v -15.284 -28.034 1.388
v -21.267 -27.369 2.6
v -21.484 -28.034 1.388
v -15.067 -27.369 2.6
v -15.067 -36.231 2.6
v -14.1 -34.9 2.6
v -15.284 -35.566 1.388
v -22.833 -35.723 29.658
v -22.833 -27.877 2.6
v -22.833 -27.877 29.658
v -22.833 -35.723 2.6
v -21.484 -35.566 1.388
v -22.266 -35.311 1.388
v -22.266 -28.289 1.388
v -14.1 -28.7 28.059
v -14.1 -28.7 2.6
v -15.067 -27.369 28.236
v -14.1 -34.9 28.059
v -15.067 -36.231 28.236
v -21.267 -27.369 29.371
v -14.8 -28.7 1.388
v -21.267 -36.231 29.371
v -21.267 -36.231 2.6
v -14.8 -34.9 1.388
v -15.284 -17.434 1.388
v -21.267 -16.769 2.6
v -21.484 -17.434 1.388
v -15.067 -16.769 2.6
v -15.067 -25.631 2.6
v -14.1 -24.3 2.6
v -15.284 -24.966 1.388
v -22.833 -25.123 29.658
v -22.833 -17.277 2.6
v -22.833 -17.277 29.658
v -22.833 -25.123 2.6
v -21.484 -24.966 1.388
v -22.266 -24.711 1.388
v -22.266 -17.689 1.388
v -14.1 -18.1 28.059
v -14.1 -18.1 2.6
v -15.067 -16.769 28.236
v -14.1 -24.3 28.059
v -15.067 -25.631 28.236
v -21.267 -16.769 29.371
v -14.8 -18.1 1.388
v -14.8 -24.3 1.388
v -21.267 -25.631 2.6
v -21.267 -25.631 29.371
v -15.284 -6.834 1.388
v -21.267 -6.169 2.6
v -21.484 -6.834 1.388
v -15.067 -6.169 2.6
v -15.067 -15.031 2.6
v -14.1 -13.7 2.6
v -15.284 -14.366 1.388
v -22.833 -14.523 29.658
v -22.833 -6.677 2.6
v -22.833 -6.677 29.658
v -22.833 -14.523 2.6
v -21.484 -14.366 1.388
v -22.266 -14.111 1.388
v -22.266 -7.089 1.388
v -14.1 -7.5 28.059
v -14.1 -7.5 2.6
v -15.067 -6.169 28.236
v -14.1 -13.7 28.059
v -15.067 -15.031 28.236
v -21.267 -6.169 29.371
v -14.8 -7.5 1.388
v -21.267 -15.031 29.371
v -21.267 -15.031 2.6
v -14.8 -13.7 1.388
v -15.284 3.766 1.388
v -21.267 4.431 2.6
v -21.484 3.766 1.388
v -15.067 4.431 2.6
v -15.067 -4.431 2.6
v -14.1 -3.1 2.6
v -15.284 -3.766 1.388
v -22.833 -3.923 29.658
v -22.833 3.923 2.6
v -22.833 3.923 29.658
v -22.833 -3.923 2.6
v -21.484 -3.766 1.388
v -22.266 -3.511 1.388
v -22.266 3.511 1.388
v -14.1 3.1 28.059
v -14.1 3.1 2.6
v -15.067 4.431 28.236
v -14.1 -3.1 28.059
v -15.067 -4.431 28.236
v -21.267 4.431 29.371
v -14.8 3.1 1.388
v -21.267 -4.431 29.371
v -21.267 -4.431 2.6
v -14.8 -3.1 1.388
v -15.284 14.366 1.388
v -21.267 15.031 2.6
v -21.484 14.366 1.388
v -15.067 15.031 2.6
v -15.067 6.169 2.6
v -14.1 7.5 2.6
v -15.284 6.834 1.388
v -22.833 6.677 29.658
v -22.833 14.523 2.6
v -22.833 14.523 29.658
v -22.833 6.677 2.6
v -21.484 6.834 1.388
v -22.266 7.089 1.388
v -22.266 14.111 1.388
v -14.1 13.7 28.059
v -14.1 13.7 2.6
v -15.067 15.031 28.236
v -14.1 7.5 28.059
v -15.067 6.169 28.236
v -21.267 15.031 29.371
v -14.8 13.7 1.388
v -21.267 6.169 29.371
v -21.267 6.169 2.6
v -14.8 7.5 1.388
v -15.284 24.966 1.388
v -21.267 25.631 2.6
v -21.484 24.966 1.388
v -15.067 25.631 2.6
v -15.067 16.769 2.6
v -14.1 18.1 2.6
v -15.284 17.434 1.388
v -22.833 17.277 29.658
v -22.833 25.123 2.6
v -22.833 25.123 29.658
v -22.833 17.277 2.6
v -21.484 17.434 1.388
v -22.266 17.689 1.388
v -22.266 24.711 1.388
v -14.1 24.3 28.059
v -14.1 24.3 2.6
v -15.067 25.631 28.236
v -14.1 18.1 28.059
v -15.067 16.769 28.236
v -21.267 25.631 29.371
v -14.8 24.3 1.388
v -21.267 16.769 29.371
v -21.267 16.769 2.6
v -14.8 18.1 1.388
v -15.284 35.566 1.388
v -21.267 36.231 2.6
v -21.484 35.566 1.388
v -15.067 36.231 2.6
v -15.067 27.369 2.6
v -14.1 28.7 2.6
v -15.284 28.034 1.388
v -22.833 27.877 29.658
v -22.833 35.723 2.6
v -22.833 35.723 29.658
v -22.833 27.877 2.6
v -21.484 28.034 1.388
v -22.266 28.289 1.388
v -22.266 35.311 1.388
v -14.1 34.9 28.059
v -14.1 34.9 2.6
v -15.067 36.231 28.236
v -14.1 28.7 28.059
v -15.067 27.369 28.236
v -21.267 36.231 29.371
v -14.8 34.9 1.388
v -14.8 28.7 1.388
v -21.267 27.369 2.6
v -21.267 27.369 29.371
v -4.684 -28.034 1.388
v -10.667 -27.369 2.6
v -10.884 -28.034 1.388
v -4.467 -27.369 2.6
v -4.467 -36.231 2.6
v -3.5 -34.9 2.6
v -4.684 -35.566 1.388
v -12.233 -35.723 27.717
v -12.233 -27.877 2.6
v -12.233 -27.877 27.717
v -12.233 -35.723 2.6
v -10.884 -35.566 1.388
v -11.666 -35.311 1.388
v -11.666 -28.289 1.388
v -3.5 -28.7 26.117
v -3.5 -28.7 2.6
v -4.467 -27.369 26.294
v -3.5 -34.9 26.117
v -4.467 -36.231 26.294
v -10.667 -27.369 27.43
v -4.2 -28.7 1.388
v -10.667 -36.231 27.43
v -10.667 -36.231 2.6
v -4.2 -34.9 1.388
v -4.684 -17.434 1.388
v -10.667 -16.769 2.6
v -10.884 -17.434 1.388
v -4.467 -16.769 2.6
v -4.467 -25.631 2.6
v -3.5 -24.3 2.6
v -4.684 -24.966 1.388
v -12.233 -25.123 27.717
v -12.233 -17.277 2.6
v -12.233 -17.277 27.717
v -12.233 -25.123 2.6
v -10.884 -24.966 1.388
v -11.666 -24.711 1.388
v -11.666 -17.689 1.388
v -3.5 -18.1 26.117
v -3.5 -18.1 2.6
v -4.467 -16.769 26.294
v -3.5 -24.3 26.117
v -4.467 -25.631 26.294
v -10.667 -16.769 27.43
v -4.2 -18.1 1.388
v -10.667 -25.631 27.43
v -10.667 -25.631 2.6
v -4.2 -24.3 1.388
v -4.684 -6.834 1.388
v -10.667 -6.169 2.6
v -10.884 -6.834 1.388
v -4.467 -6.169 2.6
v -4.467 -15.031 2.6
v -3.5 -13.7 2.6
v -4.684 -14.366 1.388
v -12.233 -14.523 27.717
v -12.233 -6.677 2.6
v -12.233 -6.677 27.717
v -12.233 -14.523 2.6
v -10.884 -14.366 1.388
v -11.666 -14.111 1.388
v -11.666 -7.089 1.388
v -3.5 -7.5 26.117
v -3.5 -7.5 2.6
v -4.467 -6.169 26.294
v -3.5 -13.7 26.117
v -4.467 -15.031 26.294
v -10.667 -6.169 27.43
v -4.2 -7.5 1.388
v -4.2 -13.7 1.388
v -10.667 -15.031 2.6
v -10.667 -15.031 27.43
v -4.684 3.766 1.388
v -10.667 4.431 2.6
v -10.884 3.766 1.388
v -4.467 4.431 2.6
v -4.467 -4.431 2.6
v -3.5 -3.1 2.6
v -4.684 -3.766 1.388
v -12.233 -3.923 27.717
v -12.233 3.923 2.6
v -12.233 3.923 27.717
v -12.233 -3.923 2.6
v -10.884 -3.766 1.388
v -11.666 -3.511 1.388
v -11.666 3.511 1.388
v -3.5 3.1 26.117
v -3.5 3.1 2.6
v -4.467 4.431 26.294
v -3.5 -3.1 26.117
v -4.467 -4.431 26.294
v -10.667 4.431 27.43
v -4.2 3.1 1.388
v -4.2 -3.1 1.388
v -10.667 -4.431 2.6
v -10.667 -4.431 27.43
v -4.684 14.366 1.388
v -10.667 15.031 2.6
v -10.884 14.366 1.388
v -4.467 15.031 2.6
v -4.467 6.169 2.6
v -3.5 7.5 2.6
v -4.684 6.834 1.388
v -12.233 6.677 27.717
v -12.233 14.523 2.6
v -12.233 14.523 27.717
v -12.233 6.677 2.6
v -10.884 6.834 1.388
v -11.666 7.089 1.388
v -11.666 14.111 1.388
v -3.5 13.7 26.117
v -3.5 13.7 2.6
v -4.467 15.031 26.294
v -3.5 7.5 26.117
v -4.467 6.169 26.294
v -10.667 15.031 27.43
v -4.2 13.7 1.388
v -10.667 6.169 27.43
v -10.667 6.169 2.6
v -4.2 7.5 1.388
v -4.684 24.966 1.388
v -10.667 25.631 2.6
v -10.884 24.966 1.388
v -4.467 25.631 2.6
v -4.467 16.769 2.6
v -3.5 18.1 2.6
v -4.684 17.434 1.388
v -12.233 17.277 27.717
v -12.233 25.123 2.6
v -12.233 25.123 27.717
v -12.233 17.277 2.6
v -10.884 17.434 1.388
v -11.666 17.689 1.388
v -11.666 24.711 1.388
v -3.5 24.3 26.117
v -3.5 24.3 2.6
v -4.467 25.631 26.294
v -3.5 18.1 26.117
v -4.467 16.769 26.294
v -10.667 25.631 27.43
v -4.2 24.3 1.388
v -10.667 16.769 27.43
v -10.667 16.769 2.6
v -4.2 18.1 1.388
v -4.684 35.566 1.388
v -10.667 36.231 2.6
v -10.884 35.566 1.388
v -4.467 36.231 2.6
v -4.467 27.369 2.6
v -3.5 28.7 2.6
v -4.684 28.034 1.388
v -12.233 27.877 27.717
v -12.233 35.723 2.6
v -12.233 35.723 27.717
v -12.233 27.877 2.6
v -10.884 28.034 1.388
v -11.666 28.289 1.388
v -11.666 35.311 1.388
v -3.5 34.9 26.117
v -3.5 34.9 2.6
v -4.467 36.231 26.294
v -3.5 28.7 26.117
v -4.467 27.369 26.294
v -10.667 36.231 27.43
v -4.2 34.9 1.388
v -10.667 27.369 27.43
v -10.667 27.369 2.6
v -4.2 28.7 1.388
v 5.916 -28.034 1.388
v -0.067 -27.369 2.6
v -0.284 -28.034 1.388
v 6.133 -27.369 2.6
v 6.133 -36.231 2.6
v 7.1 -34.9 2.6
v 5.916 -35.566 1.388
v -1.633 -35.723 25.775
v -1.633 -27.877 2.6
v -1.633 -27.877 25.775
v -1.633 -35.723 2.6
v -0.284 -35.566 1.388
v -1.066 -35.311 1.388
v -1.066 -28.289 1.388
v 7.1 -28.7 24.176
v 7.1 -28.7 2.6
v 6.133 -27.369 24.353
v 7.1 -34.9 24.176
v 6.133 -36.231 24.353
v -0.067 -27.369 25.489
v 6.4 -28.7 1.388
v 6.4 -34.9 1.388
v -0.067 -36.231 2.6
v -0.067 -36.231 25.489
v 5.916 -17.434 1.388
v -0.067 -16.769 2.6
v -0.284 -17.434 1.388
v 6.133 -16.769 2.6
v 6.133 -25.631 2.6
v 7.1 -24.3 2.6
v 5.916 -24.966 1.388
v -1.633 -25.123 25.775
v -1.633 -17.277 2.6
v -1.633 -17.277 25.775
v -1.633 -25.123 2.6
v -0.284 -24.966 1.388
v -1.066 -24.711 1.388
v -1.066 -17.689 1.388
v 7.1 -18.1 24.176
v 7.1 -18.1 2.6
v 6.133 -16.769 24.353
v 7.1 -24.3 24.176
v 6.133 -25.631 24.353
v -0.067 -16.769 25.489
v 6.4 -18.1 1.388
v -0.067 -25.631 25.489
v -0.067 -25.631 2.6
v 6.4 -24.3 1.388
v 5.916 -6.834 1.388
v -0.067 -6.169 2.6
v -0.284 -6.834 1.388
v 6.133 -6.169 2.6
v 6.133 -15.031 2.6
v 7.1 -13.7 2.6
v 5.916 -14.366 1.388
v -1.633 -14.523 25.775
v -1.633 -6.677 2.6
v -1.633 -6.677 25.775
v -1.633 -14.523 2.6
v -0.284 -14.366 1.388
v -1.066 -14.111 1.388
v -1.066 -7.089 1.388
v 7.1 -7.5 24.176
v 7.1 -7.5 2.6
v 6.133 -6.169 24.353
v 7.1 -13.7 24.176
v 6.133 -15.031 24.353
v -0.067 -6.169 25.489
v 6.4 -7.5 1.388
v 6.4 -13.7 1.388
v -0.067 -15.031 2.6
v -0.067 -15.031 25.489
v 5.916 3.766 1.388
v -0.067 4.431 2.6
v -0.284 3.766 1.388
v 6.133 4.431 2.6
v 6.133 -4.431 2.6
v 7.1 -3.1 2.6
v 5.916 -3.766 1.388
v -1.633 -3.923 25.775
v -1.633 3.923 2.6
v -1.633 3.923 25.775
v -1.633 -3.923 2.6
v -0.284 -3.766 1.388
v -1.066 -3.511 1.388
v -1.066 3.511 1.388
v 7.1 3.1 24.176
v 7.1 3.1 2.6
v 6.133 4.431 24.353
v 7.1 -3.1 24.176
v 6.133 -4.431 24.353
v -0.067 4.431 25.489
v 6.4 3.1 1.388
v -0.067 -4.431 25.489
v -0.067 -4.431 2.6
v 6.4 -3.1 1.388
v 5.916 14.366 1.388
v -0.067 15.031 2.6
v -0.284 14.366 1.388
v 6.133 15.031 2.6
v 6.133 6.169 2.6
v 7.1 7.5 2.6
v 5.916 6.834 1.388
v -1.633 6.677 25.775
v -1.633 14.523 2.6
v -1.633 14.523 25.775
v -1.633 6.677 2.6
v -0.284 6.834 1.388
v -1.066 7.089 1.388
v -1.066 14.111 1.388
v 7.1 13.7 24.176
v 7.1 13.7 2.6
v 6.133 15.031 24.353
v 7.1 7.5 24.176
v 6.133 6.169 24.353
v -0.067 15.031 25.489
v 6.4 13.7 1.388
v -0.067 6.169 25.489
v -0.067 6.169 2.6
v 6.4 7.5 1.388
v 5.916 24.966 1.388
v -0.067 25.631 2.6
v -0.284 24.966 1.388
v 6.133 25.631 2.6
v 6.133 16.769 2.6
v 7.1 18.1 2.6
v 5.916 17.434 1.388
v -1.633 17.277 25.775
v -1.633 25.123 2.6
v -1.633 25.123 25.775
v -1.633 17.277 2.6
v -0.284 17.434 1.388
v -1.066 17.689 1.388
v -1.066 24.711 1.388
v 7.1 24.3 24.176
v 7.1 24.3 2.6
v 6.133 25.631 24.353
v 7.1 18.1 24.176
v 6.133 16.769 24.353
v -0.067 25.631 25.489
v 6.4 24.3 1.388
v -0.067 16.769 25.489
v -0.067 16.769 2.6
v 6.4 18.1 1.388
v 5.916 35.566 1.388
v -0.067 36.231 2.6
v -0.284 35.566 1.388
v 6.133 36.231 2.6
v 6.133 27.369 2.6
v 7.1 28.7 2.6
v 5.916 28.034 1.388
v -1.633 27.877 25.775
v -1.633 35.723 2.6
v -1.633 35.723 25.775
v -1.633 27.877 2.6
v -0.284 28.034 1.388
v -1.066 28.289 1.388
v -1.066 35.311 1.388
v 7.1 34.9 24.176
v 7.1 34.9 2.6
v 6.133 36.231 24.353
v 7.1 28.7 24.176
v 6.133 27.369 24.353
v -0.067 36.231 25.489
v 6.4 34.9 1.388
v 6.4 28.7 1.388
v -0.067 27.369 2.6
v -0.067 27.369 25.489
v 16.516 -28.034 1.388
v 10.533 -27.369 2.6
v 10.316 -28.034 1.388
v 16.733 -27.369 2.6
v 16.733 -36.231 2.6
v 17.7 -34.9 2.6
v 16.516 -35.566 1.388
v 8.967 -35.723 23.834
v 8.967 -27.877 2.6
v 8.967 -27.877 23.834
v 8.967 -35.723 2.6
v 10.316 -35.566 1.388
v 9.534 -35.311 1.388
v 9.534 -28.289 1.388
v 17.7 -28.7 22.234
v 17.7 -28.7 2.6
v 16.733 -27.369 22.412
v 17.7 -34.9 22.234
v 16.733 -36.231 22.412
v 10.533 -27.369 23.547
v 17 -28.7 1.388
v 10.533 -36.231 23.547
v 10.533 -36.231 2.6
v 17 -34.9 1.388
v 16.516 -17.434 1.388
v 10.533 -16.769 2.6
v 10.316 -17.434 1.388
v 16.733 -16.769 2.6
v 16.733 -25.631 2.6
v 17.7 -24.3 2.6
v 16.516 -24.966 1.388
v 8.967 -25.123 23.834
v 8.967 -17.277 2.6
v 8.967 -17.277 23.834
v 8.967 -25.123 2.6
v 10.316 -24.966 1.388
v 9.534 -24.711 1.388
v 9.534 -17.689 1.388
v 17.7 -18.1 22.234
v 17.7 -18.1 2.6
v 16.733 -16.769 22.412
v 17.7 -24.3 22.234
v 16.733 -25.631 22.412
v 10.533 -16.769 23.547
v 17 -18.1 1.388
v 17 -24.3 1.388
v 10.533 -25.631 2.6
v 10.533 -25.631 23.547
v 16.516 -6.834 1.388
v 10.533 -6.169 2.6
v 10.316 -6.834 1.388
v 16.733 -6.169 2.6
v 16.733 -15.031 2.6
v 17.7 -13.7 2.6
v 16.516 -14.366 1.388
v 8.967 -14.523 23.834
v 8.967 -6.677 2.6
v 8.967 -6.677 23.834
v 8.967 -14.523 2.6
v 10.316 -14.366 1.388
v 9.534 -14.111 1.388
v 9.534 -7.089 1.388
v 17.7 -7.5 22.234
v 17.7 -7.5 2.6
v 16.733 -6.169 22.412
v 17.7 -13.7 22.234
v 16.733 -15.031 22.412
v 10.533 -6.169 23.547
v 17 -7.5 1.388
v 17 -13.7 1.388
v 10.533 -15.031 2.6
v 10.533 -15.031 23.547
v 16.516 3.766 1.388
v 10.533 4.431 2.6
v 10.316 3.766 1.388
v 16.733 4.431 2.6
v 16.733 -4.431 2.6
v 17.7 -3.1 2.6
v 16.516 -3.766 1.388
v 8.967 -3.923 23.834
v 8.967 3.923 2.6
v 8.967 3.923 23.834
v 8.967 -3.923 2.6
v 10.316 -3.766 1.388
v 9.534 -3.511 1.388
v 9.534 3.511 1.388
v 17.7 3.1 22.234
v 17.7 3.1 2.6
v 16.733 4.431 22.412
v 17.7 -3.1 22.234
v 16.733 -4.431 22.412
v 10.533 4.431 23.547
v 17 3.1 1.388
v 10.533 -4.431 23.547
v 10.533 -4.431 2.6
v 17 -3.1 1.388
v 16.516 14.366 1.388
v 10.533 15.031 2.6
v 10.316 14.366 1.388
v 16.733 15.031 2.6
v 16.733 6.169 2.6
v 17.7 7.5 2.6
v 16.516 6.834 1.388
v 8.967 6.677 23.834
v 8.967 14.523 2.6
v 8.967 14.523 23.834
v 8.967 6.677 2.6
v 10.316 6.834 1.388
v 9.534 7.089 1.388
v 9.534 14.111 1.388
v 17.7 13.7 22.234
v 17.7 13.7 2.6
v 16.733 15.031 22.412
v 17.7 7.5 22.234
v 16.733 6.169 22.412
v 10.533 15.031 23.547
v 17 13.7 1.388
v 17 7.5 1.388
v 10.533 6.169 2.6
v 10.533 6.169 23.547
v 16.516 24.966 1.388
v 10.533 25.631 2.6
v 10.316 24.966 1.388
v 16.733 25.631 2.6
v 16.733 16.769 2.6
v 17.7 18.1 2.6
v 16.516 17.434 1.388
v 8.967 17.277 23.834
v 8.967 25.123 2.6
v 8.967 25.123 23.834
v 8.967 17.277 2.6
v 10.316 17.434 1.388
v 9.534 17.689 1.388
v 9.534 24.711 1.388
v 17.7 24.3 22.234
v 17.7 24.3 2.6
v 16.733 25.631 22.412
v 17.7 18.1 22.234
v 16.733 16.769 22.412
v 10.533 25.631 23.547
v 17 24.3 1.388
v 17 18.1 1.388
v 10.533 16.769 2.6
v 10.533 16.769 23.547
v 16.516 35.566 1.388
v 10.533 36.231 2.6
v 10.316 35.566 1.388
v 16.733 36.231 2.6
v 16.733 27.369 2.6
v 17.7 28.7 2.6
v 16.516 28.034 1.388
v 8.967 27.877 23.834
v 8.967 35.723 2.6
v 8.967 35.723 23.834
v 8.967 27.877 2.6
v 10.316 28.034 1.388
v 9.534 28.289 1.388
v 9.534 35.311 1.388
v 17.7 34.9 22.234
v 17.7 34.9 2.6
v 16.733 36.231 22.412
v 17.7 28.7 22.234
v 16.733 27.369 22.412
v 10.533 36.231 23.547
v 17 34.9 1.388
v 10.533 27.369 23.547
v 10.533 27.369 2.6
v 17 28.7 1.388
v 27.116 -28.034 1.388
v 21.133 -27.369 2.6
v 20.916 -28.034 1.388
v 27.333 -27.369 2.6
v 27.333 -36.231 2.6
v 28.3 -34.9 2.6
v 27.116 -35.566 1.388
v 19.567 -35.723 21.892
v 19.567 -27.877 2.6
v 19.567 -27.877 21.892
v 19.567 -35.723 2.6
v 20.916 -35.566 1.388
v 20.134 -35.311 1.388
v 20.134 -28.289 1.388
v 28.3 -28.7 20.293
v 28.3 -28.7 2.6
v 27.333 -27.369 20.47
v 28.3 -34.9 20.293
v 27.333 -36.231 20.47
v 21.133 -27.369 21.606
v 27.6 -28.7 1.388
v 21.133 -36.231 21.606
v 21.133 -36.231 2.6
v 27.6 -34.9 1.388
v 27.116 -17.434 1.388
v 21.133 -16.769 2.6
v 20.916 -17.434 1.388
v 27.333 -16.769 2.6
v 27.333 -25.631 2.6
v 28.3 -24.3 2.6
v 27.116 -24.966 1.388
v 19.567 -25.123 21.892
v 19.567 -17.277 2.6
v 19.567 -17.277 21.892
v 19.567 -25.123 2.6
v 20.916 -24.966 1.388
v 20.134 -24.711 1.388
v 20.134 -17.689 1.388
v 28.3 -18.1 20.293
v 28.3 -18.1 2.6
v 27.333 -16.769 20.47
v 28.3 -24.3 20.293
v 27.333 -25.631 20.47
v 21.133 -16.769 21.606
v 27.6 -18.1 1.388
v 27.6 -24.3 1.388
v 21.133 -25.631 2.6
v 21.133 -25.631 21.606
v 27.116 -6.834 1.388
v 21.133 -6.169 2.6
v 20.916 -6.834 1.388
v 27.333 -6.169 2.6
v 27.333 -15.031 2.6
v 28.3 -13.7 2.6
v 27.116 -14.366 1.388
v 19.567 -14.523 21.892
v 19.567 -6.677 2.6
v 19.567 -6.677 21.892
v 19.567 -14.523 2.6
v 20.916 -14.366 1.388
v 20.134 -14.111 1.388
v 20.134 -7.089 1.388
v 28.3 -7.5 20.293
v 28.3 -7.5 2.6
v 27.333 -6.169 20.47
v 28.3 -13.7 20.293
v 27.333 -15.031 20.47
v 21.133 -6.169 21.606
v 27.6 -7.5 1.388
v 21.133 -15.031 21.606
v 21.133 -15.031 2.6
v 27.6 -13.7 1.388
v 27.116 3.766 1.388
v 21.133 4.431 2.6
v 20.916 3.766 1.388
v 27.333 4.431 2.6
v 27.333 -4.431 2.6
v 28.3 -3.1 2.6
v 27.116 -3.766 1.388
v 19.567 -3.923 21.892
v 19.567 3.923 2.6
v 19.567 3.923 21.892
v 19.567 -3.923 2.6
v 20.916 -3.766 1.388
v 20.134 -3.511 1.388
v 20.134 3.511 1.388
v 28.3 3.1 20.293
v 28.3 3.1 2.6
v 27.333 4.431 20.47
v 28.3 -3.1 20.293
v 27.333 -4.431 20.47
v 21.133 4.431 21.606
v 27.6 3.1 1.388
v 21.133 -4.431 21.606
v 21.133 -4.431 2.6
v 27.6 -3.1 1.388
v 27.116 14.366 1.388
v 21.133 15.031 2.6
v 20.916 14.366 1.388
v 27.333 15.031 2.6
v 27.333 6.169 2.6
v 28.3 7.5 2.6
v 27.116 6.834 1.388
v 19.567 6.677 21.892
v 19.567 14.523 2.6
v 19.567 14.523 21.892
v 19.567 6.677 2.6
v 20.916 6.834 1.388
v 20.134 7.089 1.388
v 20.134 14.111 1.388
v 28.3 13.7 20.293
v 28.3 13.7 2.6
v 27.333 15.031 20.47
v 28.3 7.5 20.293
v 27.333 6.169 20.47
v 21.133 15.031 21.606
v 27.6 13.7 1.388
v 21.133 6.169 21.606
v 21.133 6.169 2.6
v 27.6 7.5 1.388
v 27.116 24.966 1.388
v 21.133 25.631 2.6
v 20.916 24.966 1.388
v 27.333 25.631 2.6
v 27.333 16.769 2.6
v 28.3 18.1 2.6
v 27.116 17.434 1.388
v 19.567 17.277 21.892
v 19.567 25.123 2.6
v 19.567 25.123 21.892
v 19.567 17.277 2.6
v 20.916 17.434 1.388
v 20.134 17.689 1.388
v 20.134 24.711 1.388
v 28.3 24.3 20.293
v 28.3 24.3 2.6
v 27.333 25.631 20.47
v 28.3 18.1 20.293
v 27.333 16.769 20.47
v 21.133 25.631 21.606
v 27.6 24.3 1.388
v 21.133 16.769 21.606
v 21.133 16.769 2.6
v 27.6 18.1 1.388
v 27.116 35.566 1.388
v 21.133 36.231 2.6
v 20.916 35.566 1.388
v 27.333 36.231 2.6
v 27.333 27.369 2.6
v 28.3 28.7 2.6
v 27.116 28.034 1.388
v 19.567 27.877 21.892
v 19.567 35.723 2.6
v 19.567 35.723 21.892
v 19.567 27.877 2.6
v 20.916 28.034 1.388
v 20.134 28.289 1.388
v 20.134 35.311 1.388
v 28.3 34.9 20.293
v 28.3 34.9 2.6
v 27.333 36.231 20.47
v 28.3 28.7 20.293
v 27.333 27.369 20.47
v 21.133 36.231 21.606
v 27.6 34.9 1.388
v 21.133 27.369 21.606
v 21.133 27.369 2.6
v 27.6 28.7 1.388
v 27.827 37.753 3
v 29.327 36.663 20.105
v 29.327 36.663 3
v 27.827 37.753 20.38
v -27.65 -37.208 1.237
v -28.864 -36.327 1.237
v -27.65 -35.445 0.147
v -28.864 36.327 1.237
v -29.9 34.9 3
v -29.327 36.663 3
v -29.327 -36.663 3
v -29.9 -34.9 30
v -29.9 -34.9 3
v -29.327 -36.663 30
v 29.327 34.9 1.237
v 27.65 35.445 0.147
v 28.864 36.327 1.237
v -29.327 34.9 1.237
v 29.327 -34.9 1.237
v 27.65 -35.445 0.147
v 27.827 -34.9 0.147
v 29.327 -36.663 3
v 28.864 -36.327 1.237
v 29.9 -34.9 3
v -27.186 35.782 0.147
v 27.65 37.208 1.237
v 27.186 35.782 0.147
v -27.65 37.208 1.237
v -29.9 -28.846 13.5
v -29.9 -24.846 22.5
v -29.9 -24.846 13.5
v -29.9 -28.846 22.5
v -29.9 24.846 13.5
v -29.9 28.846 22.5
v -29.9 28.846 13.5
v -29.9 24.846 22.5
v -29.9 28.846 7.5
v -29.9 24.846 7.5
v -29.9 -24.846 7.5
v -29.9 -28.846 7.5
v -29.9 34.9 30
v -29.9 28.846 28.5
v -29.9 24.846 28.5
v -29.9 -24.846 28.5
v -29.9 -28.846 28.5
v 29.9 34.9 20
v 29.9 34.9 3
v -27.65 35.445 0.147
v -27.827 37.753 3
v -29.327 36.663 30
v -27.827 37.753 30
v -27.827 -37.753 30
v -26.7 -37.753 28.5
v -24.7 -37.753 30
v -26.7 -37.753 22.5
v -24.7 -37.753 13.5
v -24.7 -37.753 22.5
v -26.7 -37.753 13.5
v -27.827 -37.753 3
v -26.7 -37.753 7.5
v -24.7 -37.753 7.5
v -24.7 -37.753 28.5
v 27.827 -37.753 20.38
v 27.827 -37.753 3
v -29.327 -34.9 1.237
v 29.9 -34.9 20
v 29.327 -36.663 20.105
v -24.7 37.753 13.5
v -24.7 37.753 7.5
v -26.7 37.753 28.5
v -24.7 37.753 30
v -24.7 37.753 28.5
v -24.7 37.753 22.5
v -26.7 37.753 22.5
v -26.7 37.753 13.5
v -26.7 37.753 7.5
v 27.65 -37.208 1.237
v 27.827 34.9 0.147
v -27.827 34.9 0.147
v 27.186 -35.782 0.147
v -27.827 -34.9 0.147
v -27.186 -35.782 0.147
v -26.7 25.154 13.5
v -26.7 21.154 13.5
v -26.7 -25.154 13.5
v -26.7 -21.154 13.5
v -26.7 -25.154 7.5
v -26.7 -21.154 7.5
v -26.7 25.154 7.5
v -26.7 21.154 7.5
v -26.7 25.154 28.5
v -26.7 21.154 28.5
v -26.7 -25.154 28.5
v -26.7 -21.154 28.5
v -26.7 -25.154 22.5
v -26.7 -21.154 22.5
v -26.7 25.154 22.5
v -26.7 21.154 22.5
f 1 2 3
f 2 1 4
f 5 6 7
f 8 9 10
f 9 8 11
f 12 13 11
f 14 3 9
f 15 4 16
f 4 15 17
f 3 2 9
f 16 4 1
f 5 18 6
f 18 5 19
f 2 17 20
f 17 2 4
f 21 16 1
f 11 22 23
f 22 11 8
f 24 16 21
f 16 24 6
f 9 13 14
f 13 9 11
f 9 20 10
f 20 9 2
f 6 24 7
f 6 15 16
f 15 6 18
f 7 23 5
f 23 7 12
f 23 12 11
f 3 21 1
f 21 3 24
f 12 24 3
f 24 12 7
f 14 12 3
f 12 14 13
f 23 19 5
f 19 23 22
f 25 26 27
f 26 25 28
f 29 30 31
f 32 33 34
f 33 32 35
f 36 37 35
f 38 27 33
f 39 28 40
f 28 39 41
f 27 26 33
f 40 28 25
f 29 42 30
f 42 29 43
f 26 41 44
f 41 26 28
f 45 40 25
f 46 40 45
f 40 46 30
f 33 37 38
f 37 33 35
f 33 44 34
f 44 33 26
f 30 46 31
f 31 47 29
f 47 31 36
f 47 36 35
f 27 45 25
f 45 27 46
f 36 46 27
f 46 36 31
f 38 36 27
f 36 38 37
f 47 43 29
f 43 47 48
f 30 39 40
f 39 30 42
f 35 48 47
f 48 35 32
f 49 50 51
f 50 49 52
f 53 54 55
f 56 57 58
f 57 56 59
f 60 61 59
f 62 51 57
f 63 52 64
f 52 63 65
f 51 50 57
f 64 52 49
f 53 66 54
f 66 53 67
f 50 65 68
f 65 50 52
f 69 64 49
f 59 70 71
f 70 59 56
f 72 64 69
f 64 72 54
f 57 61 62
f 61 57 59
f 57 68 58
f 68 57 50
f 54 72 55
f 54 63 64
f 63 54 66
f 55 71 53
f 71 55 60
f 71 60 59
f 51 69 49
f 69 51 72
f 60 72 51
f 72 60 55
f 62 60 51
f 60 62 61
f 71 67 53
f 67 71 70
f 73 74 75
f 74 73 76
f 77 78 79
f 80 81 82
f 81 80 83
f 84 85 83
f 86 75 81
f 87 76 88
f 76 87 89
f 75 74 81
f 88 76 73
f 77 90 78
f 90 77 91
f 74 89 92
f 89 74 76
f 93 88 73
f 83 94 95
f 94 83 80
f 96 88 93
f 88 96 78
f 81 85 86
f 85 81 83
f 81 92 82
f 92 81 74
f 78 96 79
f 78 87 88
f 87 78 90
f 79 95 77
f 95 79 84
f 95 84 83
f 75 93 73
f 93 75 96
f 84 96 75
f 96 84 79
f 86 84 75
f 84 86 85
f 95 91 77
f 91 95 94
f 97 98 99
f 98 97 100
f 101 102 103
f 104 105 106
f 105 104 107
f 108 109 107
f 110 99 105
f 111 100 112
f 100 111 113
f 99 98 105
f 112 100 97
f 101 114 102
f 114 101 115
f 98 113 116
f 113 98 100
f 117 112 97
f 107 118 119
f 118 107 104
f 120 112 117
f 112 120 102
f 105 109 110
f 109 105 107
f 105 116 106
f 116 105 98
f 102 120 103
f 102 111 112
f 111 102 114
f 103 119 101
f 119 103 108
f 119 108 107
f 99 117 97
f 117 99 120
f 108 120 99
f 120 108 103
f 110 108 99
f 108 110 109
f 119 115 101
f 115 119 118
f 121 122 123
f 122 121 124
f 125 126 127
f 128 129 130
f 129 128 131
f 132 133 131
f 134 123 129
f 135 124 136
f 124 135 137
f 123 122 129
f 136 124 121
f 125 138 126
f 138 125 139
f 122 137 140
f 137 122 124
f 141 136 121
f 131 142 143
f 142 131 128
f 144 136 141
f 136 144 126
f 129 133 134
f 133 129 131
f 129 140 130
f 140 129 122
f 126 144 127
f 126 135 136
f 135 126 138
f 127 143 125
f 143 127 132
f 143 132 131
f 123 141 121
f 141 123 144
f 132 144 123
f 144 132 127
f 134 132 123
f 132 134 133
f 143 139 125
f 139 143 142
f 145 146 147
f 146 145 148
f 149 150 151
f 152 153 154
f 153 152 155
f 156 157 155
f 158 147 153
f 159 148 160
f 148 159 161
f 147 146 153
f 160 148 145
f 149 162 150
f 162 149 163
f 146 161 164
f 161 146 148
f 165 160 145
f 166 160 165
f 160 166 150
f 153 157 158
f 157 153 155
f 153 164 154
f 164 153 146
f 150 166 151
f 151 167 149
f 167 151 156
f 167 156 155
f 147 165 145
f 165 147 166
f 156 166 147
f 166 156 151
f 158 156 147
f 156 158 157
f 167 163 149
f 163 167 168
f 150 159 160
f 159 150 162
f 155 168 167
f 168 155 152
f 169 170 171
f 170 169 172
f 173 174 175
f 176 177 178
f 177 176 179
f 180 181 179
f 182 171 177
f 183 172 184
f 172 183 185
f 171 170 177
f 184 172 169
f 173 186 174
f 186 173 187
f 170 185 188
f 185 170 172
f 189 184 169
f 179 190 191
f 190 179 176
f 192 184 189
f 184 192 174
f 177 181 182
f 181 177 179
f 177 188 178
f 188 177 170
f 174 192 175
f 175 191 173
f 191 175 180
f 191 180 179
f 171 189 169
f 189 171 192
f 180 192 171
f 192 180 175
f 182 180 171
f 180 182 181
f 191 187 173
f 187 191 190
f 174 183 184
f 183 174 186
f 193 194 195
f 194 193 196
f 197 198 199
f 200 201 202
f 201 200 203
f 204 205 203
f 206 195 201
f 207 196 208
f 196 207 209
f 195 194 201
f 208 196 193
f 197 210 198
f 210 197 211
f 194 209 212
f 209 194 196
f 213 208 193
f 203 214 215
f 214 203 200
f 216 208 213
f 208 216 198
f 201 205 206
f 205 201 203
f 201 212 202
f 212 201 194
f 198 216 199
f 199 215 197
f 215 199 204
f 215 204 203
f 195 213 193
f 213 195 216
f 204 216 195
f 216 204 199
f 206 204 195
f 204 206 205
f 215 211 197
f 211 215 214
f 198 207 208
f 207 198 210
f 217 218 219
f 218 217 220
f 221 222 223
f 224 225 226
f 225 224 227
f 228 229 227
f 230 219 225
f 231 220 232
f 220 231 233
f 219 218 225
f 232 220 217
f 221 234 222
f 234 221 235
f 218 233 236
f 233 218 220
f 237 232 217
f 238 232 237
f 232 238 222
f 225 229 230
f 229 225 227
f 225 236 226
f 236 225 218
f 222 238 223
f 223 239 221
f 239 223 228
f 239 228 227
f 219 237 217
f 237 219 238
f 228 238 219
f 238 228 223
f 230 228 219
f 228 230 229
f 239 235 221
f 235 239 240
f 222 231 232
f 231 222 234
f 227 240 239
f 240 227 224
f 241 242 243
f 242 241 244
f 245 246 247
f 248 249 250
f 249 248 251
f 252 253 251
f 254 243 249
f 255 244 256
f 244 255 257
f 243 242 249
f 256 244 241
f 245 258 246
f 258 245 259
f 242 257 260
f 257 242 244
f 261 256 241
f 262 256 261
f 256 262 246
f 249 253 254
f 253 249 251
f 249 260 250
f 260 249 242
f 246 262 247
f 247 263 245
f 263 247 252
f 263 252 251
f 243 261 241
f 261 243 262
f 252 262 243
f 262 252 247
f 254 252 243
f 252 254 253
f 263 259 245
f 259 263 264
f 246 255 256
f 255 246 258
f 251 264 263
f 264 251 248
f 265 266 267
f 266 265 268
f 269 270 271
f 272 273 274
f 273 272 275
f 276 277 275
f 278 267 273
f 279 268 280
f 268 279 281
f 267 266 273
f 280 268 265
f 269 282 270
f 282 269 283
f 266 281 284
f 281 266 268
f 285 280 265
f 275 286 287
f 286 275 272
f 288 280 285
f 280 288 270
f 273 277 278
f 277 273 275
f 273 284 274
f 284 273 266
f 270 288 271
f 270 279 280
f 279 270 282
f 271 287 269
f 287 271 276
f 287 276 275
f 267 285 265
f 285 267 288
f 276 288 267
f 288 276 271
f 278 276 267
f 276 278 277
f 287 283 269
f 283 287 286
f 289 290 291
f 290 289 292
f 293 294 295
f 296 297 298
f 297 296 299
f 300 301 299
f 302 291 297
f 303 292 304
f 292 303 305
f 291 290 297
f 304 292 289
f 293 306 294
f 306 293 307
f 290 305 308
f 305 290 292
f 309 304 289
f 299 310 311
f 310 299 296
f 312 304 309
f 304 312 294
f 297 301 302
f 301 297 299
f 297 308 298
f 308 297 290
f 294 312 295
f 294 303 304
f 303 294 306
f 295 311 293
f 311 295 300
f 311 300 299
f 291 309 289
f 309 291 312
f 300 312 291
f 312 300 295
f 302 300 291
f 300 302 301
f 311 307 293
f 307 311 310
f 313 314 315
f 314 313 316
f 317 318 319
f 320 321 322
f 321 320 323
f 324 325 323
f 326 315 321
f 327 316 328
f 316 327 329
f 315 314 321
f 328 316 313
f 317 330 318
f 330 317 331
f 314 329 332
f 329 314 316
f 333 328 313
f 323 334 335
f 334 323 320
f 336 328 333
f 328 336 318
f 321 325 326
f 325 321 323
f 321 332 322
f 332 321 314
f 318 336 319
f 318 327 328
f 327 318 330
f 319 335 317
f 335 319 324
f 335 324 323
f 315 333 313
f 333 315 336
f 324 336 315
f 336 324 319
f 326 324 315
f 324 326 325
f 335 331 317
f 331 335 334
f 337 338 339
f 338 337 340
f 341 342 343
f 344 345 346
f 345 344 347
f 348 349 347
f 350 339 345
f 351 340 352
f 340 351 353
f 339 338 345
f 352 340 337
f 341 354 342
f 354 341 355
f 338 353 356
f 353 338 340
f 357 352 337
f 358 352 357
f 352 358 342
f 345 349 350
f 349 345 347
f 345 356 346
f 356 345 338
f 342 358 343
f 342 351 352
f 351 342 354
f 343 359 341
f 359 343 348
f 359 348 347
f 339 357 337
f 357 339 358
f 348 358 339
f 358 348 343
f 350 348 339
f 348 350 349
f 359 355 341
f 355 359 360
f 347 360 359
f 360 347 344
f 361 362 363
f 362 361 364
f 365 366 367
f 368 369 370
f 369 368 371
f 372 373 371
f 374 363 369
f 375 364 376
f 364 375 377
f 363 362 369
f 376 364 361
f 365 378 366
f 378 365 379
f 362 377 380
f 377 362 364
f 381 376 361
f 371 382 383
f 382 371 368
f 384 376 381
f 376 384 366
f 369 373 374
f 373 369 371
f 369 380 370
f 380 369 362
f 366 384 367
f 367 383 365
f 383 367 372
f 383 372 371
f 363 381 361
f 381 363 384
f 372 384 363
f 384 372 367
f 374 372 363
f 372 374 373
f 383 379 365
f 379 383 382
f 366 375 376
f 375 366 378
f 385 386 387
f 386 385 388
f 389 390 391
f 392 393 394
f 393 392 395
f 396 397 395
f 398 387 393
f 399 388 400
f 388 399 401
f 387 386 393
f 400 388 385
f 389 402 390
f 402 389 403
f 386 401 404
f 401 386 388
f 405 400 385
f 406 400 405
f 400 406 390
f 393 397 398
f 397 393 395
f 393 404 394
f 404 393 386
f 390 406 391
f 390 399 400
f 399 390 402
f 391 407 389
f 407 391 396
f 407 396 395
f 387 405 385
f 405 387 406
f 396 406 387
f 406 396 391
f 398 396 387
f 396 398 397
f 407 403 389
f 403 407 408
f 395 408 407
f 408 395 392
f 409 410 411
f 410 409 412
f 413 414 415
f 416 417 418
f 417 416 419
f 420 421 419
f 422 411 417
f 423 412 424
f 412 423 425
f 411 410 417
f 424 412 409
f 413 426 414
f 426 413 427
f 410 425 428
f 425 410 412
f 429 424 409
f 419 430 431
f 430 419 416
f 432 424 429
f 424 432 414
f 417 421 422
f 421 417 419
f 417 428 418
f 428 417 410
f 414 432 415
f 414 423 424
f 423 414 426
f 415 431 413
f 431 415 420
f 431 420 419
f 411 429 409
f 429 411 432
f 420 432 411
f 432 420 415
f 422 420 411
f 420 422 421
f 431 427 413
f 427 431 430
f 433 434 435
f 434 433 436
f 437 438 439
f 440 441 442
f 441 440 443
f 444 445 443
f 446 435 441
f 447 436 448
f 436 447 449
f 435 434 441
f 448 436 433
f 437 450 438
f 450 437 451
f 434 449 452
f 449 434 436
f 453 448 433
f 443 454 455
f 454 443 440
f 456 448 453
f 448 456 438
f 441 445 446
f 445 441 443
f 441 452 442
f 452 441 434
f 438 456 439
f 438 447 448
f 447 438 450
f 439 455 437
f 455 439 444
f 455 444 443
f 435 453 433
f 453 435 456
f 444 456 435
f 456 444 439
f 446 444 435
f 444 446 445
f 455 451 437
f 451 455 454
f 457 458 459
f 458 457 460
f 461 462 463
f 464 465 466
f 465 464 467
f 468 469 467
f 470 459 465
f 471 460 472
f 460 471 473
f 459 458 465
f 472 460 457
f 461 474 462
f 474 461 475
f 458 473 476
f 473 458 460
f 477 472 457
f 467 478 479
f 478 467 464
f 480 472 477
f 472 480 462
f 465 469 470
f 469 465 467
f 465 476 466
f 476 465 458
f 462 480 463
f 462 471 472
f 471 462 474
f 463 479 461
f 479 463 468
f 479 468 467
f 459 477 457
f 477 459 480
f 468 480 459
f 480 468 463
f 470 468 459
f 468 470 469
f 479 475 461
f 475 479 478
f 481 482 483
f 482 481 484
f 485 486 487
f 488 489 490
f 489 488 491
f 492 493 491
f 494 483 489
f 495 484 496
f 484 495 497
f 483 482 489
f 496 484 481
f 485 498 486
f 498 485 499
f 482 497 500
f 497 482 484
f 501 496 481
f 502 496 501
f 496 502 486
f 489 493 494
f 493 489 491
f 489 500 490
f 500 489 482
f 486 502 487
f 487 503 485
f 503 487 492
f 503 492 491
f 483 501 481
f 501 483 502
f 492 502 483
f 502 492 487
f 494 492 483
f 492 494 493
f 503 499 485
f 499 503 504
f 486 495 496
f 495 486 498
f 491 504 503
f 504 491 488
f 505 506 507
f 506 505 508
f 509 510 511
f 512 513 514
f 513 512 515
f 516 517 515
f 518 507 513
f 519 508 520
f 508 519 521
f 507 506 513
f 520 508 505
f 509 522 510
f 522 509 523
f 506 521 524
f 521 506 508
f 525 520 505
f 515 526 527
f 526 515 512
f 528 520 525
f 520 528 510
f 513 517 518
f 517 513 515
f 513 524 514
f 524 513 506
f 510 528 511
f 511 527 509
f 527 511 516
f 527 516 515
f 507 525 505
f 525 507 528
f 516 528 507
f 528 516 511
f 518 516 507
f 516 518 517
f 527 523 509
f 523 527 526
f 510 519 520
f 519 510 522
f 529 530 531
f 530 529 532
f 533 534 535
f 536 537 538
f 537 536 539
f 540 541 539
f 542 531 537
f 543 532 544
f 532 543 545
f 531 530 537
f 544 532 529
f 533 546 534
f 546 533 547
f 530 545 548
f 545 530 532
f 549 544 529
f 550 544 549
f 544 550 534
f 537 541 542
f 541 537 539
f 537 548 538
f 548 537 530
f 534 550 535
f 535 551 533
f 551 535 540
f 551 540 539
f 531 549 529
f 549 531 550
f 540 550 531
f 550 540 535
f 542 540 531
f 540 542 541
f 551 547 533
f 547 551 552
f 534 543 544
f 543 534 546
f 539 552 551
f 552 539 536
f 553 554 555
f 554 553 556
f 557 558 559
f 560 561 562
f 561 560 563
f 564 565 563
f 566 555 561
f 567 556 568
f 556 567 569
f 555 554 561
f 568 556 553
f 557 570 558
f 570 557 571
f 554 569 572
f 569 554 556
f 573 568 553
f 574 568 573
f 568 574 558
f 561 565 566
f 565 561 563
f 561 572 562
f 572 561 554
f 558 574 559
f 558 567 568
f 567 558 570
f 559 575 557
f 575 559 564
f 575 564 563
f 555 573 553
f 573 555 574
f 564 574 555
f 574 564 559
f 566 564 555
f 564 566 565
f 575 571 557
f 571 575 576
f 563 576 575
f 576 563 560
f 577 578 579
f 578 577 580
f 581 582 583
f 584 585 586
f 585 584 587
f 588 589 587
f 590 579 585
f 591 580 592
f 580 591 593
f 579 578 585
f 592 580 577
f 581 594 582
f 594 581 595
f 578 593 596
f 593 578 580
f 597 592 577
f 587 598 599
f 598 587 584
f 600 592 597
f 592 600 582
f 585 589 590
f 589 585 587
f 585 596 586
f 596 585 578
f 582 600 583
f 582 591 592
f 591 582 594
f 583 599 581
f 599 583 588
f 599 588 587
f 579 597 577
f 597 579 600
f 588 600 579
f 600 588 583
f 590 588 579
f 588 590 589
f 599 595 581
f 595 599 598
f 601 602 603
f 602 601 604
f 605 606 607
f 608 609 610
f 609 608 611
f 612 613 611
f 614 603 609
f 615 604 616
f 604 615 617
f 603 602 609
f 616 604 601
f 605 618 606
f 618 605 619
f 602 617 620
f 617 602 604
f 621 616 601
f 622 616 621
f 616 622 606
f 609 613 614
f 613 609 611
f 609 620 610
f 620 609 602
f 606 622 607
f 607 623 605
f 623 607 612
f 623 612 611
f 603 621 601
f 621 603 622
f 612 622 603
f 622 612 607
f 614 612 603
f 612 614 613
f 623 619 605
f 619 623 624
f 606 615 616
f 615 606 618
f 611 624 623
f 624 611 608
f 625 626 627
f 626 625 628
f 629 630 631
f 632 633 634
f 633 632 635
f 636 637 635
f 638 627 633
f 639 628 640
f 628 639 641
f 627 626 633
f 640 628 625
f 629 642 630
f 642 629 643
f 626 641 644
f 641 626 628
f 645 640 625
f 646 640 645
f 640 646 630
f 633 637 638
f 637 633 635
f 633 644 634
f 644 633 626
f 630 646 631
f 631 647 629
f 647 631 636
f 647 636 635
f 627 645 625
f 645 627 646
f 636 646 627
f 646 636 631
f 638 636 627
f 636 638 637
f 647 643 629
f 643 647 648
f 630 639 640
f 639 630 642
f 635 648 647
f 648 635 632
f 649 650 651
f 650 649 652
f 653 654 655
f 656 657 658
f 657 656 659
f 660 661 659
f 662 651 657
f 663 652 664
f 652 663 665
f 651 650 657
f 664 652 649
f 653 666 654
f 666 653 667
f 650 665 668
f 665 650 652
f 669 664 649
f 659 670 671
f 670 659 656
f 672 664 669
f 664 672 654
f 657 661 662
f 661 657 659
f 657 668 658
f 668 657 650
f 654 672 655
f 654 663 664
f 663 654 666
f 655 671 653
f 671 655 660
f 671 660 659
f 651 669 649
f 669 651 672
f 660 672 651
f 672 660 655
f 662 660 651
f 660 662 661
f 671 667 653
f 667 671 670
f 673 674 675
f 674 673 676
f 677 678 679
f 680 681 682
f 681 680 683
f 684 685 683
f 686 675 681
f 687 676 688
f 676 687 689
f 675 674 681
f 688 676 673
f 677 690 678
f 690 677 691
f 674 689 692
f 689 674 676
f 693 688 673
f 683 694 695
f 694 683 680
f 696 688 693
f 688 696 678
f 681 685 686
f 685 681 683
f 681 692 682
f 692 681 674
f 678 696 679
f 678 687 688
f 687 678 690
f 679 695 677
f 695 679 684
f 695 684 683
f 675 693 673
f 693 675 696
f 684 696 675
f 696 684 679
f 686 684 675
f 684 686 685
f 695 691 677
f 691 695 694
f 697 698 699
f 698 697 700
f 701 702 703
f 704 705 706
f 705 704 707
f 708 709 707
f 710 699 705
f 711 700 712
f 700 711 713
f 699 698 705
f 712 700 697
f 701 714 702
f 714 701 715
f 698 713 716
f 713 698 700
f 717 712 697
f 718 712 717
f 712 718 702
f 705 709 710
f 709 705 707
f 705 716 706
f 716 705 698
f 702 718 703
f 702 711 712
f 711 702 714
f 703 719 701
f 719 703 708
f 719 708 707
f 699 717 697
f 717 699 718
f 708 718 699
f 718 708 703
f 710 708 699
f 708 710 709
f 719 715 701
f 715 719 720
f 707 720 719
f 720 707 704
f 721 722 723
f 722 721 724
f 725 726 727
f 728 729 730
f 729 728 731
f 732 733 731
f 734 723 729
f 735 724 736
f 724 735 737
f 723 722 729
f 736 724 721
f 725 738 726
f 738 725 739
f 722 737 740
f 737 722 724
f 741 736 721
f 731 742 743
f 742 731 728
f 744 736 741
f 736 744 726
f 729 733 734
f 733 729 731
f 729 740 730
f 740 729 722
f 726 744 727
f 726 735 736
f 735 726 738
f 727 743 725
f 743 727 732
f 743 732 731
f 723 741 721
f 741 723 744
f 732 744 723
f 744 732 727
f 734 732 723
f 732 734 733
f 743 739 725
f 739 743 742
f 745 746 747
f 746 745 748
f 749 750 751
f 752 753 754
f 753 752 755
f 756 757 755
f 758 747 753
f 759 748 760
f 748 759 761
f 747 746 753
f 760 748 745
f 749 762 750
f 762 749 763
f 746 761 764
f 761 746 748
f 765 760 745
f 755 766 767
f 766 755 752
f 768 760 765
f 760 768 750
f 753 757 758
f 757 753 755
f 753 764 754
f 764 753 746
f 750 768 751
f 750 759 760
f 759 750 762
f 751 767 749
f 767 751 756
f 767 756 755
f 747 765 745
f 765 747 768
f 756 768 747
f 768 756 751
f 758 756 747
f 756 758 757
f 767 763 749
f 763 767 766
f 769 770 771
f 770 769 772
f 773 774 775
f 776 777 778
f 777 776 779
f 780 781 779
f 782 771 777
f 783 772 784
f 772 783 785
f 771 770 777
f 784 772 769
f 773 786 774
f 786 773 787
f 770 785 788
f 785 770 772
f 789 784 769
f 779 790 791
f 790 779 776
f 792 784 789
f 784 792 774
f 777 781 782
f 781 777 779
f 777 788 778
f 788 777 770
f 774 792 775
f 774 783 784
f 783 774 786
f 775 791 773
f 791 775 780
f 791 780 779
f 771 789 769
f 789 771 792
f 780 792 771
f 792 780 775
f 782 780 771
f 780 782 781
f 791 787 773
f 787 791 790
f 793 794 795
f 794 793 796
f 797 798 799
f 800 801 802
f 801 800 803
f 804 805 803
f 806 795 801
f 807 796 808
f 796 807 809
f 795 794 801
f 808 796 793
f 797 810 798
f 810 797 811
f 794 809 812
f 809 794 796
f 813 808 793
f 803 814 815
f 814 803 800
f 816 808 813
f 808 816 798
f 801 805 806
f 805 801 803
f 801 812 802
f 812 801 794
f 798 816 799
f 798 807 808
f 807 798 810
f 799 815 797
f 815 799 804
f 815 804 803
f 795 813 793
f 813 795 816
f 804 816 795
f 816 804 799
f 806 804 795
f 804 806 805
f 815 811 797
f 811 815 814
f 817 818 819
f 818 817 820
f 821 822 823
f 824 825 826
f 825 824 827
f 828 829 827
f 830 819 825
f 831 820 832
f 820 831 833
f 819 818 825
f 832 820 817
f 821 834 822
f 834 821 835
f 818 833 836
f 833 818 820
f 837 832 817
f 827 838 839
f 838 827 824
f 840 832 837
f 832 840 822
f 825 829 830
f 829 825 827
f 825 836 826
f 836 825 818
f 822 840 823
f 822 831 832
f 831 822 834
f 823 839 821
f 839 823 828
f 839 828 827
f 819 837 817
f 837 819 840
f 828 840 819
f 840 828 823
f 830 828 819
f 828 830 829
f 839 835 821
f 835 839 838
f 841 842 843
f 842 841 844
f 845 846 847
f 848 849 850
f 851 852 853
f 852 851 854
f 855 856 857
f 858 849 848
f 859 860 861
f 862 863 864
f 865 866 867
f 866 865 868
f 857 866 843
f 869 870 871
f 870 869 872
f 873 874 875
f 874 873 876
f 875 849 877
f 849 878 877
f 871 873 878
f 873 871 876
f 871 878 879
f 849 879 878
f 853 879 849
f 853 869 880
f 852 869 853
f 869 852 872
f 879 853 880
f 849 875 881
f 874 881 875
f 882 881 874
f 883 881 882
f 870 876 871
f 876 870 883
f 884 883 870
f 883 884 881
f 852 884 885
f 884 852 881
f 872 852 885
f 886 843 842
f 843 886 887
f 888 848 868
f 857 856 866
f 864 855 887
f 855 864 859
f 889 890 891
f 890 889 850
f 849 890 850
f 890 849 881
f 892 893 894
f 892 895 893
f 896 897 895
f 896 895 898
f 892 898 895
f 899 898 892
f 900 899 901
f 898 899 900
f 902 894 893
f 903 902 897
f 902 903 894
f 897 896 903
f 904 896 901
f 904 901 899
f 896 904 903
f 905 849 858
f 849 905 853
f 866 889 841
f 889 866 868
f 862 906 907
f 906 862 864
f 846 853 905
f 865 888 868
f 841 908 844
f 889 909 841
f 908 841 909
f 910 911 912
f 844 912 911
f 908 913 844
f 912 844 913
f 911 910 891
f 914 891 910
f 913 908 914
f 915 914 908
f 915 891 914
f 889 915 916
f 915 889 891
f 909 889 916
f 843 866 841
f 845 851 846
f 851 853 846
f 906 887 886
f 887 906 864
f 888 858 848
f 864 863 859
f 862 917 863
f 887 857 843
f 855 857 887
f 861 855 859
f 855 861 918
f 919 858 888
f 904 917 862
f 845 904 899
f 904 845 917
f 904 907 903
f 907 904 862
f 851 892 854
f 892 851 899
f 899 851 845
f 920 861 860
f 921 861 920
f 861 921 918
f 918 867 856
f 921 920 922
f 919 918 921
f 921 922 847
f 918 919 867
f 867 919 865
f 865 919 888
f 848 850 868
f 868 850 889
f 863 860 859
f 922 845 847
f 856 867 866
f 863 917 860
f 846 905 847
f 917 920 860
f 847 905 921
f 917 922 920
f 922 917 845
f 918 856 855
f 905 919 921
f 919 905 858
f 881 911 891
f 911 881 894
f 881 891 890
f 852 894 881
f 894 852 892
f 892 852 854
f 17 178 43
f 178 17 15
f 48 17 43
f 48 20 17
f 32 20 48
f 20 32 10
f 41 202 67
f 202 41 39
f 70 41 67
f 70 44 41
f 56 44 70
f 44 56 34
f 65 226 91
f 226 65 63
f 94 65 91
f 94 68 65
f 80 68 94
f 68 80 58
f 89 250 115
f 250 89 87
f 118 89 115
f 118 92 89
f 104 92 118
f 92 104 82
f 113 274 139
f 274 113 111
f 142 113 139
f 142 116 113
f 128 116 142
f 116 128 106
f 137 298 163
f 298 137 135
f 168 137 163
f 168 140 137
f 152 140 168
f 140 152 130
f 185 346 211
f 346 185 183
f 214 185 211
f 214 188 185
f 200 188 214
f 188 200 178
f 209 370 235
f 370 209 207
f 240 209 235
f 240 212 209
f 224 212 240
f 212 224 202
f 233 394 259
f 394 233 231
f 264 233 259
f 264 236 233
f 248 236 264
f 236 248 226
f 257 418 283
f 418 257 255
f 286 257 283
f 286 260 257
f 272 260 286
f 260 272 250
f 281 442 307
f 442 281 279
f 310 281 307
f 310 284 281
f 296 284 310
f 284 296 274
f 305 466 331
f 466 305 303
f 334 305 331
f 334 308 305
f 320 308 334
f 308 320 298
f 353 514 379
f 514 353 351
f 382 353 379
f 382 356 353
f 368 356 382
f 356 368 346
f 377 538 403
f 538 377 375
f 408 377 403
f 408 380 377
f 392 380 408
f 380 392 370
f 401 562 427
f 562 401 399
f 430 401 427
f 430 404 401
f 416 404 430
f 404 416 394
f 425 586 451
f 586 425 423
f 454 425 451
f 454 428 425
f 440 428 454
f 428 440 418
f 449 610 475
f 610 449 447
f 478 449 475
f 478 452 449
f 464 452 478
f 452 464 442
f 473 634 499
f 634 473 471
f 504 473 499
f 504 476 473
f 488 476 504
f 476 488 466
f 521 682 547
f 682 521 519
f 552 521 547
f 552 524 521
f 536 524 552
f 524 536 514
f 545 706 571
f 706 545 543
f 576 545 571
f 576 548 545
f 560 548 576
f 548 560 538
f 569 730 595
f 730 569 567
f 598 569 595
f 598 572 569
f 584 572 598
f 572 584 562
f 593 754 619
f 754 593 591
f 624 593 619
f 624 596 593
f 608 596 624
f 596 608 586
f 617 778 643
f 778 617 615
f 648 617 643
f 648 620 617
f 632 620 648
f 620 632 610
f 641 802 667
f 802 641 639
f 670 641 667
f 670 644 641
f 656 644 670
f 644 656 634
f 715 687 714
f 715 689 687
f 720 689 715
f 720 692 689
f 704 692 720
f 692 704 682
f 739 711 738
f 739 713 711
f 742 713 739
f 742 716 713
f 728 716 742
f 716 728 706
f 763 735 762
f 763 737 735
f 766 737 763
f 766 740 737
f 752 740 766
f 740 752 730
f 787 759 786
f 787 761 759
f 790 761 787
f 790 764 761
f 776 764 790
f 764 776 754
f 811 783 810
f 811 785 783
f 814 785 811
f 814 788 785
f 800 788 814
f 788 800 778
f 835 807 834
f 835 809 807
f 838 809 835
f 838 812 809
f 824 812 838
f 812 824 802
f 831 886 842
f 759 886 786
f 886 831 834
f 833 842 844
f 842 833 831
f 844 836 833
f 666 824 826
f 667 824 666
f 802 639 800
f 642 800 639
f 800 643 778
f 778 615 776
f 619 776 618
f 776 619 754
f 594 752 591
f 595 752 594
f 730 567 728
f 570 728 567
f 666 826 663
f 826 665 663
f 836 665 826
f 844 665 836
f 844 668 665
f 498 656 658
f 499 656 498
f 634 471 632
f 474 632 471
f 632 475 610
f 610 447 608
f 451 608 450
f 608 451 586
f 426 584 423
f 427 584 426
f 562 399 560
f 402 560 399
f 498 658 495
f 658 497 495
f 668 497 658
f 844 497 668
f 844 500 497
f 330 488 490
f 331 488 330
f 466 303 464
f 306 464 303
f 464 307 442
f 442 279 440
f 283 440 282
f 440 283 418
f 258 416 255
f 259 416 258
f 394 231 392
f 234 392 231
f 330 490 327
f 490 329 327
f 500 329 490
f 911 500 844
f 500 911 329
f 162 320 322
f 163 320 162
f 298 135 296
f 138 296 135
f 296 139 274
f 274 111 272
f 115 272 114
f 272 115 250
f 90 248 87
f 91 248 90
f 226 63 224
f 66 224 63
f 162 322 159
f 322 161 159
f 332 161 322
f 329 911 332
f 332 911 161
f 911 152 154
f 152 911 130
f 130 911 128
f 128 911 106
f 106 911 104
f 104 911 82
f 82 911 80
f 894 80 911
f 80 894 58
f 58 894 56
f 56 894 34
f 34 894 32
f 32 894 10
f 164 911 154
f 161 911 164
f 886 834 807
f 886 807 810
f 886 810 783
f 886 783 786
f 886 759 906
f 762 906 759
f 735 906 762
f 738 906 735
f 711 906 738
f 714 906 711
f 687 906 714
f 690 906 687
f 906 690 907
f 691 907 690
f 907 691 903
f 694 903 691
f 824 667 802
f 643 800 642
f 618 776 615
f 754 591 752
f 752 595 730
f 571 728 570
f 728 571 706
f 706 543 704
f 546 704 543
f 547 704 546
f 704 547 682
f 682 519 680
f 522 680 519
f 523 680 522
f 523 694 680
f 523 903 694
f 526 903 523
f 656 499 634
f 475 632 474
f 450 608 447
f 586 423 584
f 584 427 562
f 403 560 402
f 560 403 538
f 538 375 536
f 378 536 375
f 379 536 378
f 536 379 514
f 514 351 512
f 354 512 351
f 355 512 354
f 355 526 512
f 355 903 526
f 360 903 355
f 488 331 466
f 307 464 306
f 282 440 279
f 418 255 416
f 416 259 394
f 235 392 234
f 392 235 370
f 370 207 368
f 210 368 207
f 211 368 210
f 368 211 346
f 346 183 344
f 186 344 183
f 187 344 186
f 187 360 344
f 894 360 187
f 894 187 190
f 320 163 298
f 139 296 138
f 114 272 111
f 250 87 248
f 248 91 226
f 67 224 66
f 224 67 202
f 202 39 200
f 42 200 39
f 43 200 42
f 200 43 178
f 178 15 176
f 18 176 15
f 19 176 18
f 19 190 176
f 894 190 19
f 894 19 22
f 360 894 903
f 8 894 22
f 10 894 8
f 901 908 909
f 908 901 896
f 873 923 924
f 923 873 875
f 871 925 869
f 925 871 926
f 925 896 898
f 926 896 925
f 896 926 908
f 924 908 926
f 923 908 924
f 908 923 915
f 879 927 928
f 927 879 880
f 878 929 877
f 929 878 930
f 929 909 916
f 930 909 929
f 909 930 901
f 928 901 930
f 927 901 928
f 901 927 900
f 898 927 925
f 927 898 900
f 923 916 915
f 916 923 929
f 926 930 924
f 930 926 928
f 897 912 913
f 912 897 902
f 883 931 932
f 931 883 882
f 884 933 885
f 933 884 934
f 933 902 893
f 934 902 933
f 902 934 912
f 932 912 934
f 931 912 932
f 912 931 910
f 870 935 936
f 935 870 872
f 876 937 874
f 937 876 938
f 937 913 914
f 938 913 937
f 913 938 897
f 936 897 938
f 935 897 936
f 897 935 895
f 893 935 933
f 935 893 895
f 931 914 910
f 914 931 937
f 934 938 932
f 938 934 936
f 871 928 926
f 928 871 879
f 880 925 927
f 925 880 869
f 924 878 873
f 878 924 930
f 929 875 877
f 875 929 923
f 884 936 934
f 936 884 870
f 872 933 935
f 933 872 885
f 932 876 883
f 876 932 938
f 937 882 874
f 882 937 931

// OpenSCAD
// Number of cells in the x direction
num_cells_x = 5; // [1:12]

// Number of cells in the y direction
num_cells_y = 7; // [1:12]

// Inside size of each cell in the x direction
cell_size_x = 9; // [0:100]

// Inside size of each cell in the y direction
cell_size_y = 9; // [0:100]

// Max height of the tray (including bottom)
tray_max_height = 30; // [0:100]

// Height at front
height_at_front = 20; // [0:100]

// The width of the zip tie (add a couple of mm)
zip_width = 6; // [3:10]

// The thickness of the zip tie
zip_thickness = 2; // [1:5]

// Distance between the angled zip holes
distance_between_holes = 50; // [20:200]

// radius of rounding of the bottom (should be less than half the minimum cell dimension)
rounding = 3; // [1:50]

// thickness of the vertical walls
sidewall = 1.6;

// thickness of the bottom
bottom = 1.2;

// resolution used to render curved surfaces (experiment with low resolutions, and render the final results with higher resolution settings)
resolution = 16; // [30:Low (12 degrees), 60:Medium (6 degrees), 120:High (3 degrees)]


////////////////////////////////////////////////////////////

module roundedCube(x, y, z, fillet)
{
	if (fillet <= 0) {
		cube([x,y,z], center=true);
	} else {
    assign (x = x/2-fillet, y = y/2-fillet, z = z/2-fillet) {
			hull() {
				for(xx = [-x,x]) {
					for(yy = [-y,y]) {
						for(zz = [-z,z]) {
							translate([xx,yy,zz]) {
								sphere(fillet);
							}
						}
					}
				}
			}
		}
	}
}


module zip_hole(length, width, height)
{
  translate([-length/2, -5, 0])
  linear_extrude(height=height)
  polygon(points=[
      [0, 0],
      [0, width],
      [length, 10],
      [length, 10 - width]]);
}


mount_thickness = sidewall * 2;
back_addition = zip_thickness + mount_thickness;

xoutside = cell_size_x * num_cells_x + sidewall * (num_cells_x + 1) + back_addition;
youtside = cell_size_y * num_cells_y + sidewall * (num_cells_y + 1);

angled_mount_width = zip_thickness + 1;
mount1_height = tray_max_height/4;
mount2_height = tray_max_height/4*3;

difference() {
  translate([0, 0, tray_max_height])
  difference() {
    roundedCube(xoutside, youtside, tray_max_height*2, rounding);
    for (x = [0:num_cells_x-1]) {
      for (y = [0:num_cells_y-1]) {
        translate([
            -xoutside/2 + (sidewall + cell_size_x/2) + x * (sidewall + cell_size_x) + back_addition,
            -youtside/2 + (sidewall + cell_size_y/2) + y * (sidewall + cell_size_y), 0]) {
          roundedCube(cell_size_x, cell_size_y, (tray_max_height - bottom)*2, rounding - sidewall);
        }
      }
    }
    // Angled top
    translate([xoutside/2, youtside/2 + .5, -tray_max_height]) {
      rotate([0, -90, 90])
      linear_extrude(height=youtside + 1)
      polygon(points=[
          [height_at_front, 0],
          [height_at_front, -1],
          [tray_max_height*2 + 1, -1],
          [tray_max_height*2 + 1, xoutside + 1],
          [tray_max_height, xoutside + 1],
          [tray_max_height, xoutside - back_addition]]);
    }
  }
  // Ziptie paths
  translate([-xoutside/2 + mount_thickness, -youtside/2 - .5, 0]) {
    translate([0, 0, mount1_height])
      cube([zip_thickness, youtside + 1, zip_width]);
    translate([0, 0, mount2_height])
      cube([zip_thickness, youtside + 1, zip_width]);
  }
  translate([-(xoutside/2 - sidewall) , 0, 0]) {
    translate([0, 0, mount1_height]) {
      translate([0, -distance_between_holes/2, 0])
      zip_hole(back_addition, zip_thickness*2, zip_width);
      mirror([1, 0, 0])
      translate([0, distance_between_holes/2, 0])
      zip_hole(back_addition, zip_thickness*2, zip_width);
    }
    translate([0, 0, mount2_height]) {
      translate([0, -distance_between_holes/2, 0])
      zip_hole(back_addition, zip_thickness*2, zip_width);
      mirror([1, 0, 0])
      translate([0, distance_between_holes/2, 0])
      zip_hole(back_addition, zip_thickness*2, zip_width);
    }
  }
}
